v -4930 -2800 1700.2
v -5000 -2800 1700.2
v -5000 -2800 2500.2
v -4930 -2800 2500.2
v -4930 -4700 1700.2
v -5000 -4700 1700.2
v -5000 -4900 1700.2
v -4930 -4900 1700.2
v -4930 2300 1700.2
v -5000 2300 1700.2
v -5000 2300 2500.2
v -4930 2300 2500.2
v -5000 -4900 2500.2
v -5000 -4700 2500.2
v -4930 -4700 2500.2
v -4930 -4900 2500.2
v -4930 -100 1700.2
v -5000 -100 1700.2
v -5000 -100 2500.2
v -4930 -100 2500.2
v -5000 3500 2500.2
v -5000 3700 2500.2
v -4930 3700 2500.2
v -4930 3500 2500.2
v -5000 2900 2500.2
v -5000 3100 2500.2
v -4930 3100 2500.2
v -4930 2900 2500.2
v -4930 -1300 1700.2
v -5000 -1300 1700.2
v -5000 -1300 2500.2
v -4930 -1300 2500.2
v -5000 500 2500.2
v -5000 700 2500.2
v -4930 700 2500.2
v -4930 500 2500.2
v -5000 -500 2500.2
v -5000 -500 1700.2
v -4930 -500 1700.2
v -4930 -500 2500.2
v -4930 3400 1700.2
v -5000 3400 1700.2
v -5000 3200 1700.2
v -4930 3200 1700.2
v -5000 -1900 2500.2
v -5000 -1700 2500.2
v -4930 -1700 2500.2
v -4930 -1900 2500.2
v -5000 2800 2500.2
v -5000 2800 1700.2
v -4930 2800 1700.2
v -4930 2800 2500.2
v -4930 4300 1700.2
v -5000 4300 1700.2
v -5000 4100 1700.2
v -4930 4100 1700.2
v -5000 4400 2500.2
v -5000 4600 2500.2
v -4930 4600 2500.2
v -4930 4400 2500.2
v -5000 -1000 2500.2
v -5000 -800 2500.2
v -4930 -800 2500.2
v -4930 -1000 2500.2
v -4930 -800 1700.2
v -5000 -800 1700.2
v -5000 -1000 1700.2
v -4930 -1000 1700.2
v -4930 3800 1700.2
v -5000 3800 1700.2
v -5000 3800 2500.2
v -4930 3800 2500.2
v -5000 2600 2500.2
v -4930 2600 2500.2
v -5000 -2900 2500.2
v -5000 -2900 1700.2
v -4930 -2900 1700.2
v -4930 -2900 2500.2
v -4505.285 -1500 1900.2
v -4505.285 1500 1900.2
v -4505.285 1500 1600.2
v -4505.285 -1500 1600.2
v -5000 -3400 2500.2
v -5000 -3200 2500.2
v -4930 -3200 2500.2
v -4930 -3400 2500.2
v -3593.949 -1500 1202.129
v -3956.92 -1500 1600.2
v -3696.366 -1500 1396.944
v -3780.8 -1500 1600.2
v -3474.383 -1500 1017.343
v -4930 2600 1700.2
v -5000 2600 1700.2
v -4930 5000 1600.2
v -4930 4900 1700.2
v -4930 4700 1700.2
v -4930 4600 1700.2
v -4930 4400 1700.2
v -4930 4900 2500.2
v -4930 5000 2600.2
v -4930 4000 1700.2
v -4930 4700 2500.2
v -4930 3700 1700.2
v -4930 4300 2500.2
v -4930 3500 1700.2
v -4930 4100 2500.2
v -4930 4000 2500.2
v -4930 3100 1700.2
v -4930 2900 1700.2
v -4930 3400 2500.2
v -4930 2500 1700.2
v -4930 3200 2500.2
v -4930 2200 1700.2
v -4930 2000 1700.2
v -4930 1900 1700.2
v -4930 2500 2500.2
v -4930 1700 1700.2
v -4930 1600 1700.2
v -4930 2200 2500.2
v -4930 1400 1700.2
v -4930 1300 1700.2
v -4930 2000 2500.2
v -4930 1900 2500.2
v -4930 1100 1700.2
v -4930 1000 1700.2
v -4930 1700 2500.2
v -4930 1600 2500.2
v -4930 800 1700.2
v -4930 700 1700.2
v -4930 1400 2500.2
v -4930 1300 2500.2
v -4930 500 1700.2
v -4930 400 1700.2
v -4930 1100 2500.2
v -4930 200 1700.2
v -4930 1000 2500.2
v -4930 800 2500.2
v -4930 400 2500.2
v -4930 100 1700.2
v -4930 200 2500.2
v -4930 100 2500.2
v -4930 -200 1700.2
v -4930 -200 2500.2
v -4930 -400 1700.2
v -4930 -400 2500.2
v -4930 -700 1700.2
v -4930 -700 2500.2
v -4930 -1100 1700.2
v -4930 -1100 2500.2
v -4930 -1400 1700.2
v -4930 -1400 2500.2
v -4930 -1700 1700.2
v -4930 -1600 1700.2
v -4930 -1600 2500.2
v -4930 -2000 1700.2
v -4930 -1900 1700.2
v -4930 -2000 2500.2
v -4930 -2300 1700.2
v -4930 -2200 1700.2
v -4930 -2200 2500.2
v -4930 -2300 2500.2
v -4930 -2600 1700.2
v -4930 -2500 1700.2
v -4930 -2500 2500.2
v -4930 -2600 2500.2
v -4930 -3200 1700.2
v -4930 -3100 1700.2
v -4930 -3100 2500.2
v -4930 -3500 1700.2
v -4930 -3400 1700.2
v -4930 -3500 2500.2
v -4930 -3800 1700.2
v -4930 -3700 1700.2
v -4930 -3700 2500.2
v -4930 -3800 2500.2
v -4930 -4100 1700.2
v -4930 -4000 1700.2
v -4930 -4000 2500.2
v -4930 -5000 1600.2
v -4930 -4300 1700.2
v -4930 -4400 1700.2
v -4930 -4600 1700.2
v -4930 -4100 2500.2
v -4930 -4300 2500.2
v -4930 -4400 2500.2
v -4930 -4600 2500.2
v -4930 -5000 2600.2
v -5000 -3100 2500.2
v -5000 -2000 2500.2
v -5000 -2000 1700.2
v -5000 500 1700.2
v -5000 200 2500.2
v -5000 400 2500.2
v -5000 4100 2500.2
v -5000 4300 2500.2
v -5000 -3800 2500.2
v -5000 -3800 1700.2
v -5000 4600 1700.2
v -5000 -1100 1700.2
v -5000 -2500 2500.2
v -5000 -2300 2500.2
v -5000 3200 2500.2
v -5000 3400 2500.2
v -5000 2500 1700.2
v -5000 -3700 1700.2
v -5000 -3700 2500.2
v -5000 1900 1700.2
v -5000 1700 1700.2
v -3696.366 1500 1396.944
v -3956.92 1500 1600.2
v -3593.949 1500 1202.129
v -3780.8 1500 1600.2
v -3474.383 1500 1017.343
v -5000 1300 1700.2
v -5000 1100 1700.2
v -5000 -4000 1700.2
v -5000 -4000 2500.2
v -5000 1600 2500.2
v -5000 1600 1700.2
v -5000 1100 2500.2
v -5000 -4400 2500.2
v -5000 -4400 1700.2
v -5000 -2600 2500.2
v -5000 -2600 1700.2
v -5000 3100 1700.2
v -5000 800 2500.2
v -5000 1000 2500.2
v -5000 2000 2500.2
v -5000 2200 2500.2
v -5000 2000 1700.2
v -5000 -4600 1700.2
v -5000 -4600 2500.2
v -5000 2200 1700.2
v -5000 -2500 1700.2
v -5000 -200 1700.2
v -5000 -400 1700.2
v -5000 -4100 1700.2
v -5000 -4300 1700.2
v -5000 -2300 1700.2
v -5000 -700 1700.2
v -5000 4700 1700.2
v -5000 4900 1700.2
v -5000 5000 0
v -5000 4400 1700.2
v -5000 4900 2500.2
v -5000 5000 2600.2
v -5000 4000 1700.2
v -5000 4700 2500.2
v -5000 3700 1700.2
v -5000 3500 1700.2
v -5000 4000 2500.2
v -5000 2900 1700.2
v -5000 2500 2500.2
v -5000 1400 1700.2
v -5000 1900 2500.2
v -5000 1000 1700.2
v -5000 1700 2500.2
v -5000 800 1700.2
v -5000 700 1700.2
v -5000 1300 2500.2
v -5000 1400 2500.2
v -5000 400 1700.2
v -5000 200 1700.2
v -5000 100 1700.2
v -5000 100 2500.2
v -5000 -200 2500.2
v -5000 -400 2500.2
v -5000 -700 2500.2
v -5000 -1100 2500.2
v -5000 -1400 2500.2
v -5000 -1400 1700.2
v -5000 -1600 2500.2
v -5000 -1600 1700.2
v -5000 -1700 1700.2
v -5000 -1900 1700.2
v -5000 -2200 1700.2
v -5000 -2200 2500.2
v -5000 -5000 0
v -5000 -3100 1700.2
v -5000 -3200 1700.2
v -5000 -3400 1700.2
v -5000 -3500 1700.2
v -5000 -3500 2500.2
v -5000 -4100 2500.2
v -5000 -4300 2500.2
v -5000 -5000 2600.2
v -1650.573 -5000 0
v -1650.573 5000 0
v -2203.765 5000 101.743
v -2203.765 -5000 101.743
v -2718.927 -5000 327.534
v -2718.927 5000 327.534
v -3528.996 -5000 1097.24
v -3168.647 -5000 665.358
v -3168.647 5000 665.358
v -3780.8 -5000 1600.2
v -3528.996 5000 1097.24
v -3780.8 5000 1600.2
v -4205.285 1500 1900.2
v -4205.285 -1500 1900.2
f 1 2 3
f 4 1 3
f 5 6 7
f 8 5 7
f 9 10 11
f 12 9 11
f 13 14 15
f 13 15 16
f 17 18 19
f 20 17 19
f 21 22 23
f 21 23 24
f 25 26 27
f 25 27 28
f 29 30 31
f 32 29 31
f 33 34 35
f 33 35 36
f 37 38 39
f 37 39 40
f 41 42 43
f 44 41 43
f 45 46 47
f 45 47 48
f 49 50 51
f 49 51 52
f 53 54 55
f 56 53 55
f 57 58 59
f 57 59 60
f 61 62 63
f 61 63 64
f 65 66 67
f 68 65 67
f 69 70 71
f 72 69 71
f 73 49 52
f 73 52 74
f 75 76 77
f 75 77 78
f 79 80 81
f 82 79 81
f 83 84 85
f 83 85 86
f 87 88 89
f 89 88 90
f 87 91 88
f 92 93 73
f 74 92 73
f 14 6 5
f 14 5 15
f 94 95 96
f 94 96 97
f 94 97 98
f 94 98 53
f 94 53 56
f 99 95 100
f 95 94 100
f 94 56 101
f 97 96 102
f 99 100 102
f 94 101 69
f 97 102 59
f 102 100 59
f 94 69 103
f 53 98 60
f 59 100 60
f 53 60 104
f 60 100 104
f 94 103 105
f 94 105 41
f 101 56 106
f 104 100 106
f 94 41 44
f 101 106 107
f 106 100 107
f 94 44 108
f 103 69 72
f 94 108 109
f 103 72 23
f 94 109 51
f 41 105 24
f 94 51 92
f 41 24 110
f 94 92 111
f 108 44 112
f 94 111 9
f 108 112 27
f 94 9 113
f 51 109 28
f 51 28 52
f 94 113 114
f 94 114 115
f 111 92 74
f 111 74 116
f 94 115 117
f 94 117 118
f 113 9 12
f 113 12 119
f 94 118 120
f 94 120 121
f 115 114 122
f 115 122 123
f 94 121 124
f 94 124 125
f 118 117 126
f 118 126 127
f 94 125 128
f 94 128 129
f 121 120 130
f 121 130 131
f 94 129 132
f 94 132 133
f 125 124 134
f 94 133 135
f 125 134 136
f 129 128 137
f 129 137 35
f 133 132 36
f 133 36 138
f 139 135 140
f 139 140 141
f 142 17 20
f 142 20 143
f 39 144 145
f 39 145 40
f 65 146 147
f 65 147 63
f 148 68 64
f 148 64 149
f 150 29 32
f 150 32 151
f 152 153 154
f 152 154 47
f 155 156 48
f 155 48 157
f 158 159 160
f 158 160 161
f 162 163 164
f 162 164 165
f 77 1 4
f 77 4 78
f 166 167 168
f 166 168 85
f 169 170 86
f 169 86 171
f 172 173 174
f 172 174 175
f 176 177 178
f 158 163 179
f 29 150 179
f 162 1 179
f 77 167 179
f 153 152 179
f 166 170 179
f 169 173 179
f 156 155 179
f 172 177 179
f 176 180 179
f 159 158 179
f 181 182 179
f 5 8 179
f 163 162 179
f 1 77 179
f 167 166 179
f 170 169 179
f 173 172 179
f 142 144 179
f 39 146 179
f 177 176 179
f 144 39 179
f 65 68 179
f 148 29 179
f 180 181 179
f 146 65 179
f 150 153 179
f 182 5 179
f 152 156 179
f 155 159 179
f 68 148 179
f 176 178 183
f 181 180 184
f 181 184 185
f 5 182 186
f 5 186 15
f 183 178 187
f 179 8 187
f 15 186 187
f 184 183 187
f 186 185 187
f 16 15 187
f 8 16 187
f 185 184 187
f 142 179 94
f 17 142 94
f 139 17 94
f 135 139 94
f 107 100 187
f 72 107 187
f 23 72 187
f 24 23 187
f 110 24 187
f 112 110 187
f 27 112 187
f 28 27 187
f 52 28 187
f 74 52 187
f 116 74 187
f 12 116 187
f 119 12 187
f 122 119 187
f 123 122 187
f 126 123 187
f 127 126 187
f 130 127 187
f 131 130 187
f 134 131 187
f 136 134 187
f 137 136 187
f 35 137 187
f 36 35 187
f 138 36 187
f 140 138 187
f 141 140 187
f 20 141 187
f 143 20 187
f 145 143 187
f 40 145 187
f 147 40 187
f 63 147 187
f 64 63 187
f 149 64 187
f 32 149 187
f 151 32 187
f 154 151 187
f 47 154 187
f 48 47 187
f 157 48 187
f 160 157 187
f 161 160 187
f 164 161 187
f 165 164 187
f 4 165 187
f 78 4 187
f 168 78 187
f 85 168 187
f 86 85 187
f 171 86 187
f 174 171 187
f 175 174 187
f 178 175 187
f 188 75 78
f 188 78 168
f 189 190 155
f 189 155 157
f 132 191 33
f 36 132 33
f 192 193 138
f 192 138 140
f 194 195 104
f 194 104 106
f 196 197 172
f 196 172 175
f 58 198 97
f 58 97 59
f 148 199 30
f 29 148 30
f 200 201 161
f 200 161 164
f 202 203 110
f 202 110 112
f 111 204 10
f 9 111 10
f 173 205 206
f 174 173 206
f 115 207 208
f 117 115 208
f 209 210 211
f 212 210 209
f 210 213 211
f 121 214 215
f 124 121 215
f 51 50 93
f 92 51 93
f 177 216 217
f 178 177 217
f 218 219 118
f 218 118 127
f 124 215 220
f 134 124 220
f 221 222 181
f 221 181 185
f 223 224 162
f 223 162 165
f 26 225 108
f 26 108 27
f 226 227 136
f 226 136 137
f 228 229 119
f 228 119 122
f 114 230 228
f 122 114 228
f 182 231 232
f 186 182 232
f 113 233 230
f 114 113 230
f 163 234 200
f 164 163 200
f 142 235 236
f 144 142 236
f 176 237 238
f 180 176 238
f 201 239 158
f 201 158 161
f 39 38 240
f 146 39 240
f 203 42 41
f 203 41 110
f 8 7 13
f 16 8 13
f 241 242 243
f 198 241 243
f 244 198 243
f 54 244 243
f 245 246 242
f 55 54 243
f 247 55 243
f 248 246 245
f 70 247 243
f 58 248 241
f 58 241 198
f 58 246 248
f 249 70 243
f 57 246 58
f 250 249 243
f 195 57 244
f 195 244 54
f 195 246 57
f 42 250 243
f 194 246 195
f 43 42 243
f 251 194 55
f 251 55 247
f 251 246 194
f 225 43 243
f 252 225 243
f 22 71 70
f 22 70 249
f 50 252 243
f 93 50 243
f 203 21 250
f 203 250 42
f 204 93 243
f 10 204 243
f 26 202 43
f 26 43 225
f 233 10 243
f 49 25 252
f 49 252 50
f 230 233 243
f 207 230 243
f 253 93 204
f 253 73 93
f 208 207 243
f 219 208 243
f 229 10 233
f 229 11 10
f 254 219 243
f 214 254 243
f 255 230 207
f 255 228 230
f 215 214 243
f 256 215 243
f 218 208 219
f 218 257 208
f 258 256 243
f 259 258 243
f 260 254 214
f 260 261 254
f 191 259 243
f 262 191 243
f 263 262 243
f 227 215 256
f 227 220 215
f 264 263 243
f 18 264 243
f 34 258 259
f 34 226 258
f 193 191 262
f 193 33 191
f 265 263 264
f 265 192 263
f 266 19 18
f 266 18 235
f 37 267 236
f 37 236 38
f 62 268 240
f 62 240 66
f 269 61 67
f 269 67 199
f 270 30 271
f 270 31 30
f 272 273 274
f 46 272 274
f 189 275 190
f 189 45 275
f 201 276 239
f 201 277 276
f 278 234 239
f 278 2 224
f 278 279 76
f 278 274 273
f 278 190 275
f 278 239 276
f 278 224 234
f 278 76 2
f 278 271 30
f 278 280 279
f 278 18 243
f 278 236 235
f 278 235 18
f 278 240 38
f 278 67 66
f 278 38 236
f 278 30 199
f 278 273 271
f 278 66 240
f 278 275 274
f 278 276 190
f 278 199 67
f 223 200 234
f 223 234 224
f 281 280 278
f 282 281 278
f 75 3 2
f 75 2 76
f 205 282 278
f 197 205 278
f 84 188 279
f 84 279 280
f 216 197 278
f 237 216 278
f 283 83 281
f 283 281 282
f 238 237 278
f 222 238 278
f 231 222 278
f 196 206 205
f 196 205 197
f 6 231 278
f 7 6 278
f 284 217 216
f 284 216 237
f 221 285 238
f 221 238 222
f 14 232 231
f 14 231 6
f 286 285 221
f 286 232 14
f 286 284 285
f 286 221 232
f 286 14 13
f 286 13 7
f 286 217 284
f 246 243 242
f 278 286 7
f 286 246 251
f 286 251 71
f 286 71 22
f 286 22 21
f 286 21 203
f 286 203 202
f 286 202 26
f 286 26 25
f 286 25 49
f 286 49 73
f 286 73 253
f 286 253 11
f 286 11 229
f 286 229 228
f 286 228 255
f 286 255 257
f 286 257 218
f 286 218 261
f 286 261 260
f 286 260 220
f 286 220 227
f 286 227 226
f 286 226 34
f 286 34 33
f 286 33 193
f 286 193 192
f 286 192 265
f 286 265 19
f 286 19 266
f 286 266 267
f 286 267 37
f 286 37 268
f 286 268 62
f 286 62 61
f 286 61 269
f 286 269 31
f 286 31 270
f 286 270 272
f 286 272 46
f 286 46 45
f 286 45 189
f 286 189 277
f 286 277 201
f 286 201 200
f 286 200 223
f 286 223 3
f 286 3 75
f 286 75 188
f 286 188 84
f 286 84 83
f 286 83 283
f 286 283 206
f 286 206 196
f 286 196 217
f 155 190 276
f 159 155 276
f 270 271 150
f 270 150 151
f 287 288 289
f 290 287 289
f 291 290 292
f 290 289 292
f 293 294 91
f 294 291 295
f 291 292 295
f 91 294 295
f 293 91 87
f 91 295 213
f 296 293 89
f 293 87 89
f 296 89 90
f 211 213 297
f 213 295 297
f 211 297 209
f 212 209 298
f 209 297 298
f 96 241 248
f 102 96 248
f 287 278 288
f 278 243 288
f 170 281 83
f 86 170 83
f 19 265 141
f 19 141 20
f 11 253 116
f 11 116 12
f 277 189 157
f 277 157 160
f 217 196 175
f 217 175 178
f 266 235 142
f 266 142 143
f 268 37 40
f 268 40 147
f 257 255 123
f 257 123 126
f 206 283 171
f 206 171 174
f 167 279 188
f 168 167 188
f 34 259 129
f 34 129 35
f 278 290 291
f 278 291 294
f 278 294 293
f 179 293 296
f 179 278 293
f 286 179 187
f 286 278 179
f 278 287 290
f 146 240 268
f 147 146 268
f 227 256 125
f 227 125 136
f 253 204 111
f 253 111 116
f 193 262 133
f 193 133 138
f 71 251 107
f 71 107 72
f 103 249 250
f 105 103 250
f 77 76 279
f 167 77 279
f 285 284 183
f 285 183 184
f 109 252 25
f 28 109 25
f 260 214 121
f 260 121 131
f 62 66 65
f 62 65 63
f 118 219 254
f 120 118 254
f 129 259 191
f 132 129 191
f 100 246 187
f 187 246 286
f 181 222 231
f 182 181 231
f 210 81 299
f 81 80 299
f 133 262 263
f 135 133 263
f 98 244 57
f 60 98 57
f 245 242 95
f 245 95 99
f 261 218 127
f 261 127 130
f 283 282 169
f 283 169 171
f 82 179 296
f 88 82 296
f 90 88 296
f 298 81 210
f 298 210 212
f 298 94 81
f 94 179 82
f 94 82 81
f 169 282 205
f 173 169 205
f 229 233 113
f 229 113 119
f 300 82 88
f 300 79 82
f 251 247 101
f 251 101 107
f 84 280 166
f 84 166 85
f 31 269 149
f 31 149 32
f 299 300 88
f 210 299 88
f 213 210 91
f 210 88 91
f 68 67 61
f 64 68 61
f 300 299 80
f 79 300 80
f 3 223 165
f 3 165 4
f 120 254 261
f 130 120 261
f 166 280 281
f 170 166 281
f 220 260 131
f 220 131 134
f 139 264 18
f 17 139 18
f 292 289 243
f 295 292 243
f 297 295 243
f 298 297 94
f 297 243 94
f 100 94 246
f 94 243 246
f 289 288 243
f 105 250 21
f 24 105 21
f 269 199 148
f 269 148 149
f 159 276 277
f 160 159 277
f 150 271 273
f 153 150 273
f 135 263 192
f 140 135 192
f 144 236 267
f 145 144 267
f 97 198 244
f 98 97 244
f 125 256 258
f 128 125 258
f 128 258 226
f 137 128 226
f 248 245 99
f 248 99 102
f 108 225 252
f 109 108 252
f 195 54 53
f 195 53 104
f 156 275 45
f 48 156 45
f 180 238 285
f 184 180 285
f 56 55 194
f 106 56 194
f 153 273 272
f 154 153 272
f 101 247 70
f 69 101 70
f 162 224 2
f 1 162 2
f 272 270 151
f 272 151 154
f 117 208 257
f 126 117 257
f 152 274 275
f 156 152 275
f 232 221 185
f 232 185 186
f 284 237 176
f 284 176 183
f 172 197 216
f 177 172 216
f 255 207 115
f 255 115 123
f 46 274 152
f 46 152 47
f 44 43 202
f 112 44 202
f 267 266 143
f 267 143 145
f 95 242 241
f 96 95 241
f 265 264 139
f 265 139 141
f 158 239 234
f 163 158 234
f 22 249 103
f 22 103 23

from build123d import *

# Parameters (mm, degrees)
F0_W      = 1219.2
F0_H      = 10000
F1_DEPTH  = 1600.2
F4_W      = 10000
F4_H      = 1000
F4_W_2    = 200
F4_H_2    = 800
F5_DEPTH  = 70
F9_DEPTH  = 1500
F10_DEPTH = 1500


with BuildPart() as f1:
    # F0 (on Top) → F1 (new body)
    with BuildSketch(Plane.XY):
        with Locations((-4390.4, 0)):
            Rectangle(F0_W, F0_H)
    extrude(amount=F1_DEPTH)

    # F3: sweep along a path in F3_path
    with BuildLine(Plane(origin=(-3780.8, -5000, 1600.2), x_dir=(0, -1, 0), z_dir=(0, 0, -1))) as f3_path:
        Line((0, 0), (-10000, 0))
    # F2 (on face) → F3 (sweep)
    with BuildSketch(Plane.XZ.offset(5000)):
        with BuildLine():
            ThreePointArc((-1650.5727613571, 0), (-2953.5607884704, 483.4354937794), (-3780.8, 1600.2))
            Line((-3780.8, 1600.2), (-3780.8, 0))
            Line((-3780.8, 0), (-1650.5727613571, 0))
        make_face()
    sweep(path=f3_path.line)

    # F4 (on face) → F5 (join)
    with BuildSketch(Plane(origin=(-5000, 0, 0), x_dir=(0, -1, 0), z_dir=(-1, 0, 0))):
        with Locations((0, 2100.2)):
            Rectangle(F4_W, F4_H)
        with Locations((-4800, 2100.2)):
            Rectangle(F4_W_2, F4_H_2, mode=Mode.SUBTRACT)
        with Locations((-4500, 2100.2)):
            Rectangle(F4_W_2, F4_H_2, mode=Mode.SUBTRACT)
        with Locations((-4200, 2100.2)):
            Rectangle(F4_W_2, F4_H_2, mode=Mode.SUBTRACT)
        with Locations((-3900, 2100.2)):
            Rectangle(F4_W_2, F4_H_2, mode=Mode.SUBTRACT)
        with Locations((-3600, 2100.2)):
            Rectangle(F4_W_2, F4_H_2, mode=Mode.SUBTRACT)
        with Locations((-3300, 2100.2)):
            Rectangle(F4_W_2, F4_H_2, mode=Mode.SUBTRACT)
        with Locations((-3000, 2100.2)):
            Rectangle(F4_W_2, F4_H_2, mode=Mode.SUBTRACT)
        with Locations((-2700, 2100.2)):
            Rectangle(F4_W_2, F4_H_2, mode=Mode.SUBTRACT)
        with Locations((-2400, 2100.2)):
            Rectangle(F4_W_2, F4_H_2, mode=Mode.SUBTRACT)
        with Locations((-2100, 2100.2)):
            Rectangle(F4_W_2, F4_H_2, mode=Mode.SUBTRACT)
        with Locations((-1800, 2100.2)):
            Rectangle(F4_W_2, F4_H_2, mode=Mode.SUBTRACT)
        with Locations((-1500, 2100.2)):
            Rectangle(F4_W_2, F4_H_2, mode=Mode.SUBTRACT)
        with Locations((-1200, 2100.2)):
            Rectangle(F4_W_2, F4_H_2, mode=Mode.SUBTRACT)
        with Locations((-900, 2100.2)):
            Rectangle(F4_W_2, F4_H_2, mode=Mode.SUBTRACT)
        with Locations((-600, 2100.2)):
            Rectangle(F4_W_2, F4_H_2, mode=Mode.SUBTRACT)
        with Locations((-300, 2100.2)):
            Rectangle(F4_W_2, F4_H_2, mode=Mode.SUBTRACT)
        with Locations((0, 2100.2)):
            Rectangle(F4_W_2, F4_H_2, mode=Mode.SUBTRACT)
        with Locations((300, 2100.2)):
            Rectangle(F4_W_2, F4_H_2, mode=Mode.SUBTRACT)
        with Locations((600, 2100.2)):
            Rectangle(F4_W_2, F4_H_2, mode=Mode.SUBTRACT)
        with Locations((900, 2100.2)):
            Rectangle(F4_W_2, F4_H_2, mode=Mode.SUBTRACT)
        with Locations((1200, 2100.2)):
            Rectangle(F4_W_2, F4_H_2, mode=Mode.SUBTRACT)
        with Locations((1500, 2100.2)):
            Rectangle(F4_W_2, F4_H_2, mode=Mode.SUBTRACT)
        with Locations((1800, 2100.2)):
            Rectangle(F4_W_2, F4_H_2, mode=Mode.SUBTRACT)
        with Locations((2100, 2100.2)):
            Rectangle(F4_W_2, F4_H_2, mode=Mode.SUBTRACT)
        with Locations((2400, 2100.2)):
            Rectangle(F4_W_2, F4_H_2, mode=Mode.SUBTRACT)
        with Locations((2700, 2100.2)):
            Rectangle(F4_W_2, F4_H_2, mode=Mode.SUBTRACT)
        with Locations((3000, 2100.2)):
            Rectangle(F4_W_2, F4_H_2, mode=Mode.SUBTRACT)
        with Locations((3300, 2100.2)):
            Rectangle(F4_W_2, F4_H_2, mode=Mode.SUBTRACT)
        with Locations((3600, 2100.2)):
            Rectangle(F4_W_2, F4_H_2, mode=Mode.SUBTRACT)
        with Locations((3900, 2100.2)):
            Rectangle(F4_W_2, F4_H_2, mode=Mode.SUBTRACT)
        with Locations((4200, 2100.2)):
            Rectangle(F4_W_2, F4_H_2, mode=Mode.SUBTRACT)
        with Locations((4500, 2100.2)):
            Rectangle(F4_W_2, F4_H_2, mode=Mode.SUBTRACT)
        with Locations((4800, 2100.2)):
            Rectangle(F4_W_2, F4_H_2, mode=Mode.SUBTRACT)
    extrude(amount=-F5_DEPTH)

    # F8 (on face) → F9 (join, symmetric)
    with BuildSketch(Plane.XZ):
        Polygon((-4505.2851068323, 1600.2), (-3956.9200410682, 1600.2), (-4205.2851068323, 1900.2), (-4505.2851068323, 1900.2), align=None)
    extrude(amount=F9_DEPTH, both=True)

    # F8 (on face) → F10 (cut, symmetric)
    with BuildSketch(Plane.XZ):
        Polygon((-4205.2851068323, 1900.2), (-3956.9200410682, 1600.2), (-3334.445476532, 848.3133818626), (-3353.2772064209, 1927.1024372101), align=None)
    extrude(amount=F10_DEPTH, both=True, mode=Mode.SUBTRACT)


solid = f1.part
